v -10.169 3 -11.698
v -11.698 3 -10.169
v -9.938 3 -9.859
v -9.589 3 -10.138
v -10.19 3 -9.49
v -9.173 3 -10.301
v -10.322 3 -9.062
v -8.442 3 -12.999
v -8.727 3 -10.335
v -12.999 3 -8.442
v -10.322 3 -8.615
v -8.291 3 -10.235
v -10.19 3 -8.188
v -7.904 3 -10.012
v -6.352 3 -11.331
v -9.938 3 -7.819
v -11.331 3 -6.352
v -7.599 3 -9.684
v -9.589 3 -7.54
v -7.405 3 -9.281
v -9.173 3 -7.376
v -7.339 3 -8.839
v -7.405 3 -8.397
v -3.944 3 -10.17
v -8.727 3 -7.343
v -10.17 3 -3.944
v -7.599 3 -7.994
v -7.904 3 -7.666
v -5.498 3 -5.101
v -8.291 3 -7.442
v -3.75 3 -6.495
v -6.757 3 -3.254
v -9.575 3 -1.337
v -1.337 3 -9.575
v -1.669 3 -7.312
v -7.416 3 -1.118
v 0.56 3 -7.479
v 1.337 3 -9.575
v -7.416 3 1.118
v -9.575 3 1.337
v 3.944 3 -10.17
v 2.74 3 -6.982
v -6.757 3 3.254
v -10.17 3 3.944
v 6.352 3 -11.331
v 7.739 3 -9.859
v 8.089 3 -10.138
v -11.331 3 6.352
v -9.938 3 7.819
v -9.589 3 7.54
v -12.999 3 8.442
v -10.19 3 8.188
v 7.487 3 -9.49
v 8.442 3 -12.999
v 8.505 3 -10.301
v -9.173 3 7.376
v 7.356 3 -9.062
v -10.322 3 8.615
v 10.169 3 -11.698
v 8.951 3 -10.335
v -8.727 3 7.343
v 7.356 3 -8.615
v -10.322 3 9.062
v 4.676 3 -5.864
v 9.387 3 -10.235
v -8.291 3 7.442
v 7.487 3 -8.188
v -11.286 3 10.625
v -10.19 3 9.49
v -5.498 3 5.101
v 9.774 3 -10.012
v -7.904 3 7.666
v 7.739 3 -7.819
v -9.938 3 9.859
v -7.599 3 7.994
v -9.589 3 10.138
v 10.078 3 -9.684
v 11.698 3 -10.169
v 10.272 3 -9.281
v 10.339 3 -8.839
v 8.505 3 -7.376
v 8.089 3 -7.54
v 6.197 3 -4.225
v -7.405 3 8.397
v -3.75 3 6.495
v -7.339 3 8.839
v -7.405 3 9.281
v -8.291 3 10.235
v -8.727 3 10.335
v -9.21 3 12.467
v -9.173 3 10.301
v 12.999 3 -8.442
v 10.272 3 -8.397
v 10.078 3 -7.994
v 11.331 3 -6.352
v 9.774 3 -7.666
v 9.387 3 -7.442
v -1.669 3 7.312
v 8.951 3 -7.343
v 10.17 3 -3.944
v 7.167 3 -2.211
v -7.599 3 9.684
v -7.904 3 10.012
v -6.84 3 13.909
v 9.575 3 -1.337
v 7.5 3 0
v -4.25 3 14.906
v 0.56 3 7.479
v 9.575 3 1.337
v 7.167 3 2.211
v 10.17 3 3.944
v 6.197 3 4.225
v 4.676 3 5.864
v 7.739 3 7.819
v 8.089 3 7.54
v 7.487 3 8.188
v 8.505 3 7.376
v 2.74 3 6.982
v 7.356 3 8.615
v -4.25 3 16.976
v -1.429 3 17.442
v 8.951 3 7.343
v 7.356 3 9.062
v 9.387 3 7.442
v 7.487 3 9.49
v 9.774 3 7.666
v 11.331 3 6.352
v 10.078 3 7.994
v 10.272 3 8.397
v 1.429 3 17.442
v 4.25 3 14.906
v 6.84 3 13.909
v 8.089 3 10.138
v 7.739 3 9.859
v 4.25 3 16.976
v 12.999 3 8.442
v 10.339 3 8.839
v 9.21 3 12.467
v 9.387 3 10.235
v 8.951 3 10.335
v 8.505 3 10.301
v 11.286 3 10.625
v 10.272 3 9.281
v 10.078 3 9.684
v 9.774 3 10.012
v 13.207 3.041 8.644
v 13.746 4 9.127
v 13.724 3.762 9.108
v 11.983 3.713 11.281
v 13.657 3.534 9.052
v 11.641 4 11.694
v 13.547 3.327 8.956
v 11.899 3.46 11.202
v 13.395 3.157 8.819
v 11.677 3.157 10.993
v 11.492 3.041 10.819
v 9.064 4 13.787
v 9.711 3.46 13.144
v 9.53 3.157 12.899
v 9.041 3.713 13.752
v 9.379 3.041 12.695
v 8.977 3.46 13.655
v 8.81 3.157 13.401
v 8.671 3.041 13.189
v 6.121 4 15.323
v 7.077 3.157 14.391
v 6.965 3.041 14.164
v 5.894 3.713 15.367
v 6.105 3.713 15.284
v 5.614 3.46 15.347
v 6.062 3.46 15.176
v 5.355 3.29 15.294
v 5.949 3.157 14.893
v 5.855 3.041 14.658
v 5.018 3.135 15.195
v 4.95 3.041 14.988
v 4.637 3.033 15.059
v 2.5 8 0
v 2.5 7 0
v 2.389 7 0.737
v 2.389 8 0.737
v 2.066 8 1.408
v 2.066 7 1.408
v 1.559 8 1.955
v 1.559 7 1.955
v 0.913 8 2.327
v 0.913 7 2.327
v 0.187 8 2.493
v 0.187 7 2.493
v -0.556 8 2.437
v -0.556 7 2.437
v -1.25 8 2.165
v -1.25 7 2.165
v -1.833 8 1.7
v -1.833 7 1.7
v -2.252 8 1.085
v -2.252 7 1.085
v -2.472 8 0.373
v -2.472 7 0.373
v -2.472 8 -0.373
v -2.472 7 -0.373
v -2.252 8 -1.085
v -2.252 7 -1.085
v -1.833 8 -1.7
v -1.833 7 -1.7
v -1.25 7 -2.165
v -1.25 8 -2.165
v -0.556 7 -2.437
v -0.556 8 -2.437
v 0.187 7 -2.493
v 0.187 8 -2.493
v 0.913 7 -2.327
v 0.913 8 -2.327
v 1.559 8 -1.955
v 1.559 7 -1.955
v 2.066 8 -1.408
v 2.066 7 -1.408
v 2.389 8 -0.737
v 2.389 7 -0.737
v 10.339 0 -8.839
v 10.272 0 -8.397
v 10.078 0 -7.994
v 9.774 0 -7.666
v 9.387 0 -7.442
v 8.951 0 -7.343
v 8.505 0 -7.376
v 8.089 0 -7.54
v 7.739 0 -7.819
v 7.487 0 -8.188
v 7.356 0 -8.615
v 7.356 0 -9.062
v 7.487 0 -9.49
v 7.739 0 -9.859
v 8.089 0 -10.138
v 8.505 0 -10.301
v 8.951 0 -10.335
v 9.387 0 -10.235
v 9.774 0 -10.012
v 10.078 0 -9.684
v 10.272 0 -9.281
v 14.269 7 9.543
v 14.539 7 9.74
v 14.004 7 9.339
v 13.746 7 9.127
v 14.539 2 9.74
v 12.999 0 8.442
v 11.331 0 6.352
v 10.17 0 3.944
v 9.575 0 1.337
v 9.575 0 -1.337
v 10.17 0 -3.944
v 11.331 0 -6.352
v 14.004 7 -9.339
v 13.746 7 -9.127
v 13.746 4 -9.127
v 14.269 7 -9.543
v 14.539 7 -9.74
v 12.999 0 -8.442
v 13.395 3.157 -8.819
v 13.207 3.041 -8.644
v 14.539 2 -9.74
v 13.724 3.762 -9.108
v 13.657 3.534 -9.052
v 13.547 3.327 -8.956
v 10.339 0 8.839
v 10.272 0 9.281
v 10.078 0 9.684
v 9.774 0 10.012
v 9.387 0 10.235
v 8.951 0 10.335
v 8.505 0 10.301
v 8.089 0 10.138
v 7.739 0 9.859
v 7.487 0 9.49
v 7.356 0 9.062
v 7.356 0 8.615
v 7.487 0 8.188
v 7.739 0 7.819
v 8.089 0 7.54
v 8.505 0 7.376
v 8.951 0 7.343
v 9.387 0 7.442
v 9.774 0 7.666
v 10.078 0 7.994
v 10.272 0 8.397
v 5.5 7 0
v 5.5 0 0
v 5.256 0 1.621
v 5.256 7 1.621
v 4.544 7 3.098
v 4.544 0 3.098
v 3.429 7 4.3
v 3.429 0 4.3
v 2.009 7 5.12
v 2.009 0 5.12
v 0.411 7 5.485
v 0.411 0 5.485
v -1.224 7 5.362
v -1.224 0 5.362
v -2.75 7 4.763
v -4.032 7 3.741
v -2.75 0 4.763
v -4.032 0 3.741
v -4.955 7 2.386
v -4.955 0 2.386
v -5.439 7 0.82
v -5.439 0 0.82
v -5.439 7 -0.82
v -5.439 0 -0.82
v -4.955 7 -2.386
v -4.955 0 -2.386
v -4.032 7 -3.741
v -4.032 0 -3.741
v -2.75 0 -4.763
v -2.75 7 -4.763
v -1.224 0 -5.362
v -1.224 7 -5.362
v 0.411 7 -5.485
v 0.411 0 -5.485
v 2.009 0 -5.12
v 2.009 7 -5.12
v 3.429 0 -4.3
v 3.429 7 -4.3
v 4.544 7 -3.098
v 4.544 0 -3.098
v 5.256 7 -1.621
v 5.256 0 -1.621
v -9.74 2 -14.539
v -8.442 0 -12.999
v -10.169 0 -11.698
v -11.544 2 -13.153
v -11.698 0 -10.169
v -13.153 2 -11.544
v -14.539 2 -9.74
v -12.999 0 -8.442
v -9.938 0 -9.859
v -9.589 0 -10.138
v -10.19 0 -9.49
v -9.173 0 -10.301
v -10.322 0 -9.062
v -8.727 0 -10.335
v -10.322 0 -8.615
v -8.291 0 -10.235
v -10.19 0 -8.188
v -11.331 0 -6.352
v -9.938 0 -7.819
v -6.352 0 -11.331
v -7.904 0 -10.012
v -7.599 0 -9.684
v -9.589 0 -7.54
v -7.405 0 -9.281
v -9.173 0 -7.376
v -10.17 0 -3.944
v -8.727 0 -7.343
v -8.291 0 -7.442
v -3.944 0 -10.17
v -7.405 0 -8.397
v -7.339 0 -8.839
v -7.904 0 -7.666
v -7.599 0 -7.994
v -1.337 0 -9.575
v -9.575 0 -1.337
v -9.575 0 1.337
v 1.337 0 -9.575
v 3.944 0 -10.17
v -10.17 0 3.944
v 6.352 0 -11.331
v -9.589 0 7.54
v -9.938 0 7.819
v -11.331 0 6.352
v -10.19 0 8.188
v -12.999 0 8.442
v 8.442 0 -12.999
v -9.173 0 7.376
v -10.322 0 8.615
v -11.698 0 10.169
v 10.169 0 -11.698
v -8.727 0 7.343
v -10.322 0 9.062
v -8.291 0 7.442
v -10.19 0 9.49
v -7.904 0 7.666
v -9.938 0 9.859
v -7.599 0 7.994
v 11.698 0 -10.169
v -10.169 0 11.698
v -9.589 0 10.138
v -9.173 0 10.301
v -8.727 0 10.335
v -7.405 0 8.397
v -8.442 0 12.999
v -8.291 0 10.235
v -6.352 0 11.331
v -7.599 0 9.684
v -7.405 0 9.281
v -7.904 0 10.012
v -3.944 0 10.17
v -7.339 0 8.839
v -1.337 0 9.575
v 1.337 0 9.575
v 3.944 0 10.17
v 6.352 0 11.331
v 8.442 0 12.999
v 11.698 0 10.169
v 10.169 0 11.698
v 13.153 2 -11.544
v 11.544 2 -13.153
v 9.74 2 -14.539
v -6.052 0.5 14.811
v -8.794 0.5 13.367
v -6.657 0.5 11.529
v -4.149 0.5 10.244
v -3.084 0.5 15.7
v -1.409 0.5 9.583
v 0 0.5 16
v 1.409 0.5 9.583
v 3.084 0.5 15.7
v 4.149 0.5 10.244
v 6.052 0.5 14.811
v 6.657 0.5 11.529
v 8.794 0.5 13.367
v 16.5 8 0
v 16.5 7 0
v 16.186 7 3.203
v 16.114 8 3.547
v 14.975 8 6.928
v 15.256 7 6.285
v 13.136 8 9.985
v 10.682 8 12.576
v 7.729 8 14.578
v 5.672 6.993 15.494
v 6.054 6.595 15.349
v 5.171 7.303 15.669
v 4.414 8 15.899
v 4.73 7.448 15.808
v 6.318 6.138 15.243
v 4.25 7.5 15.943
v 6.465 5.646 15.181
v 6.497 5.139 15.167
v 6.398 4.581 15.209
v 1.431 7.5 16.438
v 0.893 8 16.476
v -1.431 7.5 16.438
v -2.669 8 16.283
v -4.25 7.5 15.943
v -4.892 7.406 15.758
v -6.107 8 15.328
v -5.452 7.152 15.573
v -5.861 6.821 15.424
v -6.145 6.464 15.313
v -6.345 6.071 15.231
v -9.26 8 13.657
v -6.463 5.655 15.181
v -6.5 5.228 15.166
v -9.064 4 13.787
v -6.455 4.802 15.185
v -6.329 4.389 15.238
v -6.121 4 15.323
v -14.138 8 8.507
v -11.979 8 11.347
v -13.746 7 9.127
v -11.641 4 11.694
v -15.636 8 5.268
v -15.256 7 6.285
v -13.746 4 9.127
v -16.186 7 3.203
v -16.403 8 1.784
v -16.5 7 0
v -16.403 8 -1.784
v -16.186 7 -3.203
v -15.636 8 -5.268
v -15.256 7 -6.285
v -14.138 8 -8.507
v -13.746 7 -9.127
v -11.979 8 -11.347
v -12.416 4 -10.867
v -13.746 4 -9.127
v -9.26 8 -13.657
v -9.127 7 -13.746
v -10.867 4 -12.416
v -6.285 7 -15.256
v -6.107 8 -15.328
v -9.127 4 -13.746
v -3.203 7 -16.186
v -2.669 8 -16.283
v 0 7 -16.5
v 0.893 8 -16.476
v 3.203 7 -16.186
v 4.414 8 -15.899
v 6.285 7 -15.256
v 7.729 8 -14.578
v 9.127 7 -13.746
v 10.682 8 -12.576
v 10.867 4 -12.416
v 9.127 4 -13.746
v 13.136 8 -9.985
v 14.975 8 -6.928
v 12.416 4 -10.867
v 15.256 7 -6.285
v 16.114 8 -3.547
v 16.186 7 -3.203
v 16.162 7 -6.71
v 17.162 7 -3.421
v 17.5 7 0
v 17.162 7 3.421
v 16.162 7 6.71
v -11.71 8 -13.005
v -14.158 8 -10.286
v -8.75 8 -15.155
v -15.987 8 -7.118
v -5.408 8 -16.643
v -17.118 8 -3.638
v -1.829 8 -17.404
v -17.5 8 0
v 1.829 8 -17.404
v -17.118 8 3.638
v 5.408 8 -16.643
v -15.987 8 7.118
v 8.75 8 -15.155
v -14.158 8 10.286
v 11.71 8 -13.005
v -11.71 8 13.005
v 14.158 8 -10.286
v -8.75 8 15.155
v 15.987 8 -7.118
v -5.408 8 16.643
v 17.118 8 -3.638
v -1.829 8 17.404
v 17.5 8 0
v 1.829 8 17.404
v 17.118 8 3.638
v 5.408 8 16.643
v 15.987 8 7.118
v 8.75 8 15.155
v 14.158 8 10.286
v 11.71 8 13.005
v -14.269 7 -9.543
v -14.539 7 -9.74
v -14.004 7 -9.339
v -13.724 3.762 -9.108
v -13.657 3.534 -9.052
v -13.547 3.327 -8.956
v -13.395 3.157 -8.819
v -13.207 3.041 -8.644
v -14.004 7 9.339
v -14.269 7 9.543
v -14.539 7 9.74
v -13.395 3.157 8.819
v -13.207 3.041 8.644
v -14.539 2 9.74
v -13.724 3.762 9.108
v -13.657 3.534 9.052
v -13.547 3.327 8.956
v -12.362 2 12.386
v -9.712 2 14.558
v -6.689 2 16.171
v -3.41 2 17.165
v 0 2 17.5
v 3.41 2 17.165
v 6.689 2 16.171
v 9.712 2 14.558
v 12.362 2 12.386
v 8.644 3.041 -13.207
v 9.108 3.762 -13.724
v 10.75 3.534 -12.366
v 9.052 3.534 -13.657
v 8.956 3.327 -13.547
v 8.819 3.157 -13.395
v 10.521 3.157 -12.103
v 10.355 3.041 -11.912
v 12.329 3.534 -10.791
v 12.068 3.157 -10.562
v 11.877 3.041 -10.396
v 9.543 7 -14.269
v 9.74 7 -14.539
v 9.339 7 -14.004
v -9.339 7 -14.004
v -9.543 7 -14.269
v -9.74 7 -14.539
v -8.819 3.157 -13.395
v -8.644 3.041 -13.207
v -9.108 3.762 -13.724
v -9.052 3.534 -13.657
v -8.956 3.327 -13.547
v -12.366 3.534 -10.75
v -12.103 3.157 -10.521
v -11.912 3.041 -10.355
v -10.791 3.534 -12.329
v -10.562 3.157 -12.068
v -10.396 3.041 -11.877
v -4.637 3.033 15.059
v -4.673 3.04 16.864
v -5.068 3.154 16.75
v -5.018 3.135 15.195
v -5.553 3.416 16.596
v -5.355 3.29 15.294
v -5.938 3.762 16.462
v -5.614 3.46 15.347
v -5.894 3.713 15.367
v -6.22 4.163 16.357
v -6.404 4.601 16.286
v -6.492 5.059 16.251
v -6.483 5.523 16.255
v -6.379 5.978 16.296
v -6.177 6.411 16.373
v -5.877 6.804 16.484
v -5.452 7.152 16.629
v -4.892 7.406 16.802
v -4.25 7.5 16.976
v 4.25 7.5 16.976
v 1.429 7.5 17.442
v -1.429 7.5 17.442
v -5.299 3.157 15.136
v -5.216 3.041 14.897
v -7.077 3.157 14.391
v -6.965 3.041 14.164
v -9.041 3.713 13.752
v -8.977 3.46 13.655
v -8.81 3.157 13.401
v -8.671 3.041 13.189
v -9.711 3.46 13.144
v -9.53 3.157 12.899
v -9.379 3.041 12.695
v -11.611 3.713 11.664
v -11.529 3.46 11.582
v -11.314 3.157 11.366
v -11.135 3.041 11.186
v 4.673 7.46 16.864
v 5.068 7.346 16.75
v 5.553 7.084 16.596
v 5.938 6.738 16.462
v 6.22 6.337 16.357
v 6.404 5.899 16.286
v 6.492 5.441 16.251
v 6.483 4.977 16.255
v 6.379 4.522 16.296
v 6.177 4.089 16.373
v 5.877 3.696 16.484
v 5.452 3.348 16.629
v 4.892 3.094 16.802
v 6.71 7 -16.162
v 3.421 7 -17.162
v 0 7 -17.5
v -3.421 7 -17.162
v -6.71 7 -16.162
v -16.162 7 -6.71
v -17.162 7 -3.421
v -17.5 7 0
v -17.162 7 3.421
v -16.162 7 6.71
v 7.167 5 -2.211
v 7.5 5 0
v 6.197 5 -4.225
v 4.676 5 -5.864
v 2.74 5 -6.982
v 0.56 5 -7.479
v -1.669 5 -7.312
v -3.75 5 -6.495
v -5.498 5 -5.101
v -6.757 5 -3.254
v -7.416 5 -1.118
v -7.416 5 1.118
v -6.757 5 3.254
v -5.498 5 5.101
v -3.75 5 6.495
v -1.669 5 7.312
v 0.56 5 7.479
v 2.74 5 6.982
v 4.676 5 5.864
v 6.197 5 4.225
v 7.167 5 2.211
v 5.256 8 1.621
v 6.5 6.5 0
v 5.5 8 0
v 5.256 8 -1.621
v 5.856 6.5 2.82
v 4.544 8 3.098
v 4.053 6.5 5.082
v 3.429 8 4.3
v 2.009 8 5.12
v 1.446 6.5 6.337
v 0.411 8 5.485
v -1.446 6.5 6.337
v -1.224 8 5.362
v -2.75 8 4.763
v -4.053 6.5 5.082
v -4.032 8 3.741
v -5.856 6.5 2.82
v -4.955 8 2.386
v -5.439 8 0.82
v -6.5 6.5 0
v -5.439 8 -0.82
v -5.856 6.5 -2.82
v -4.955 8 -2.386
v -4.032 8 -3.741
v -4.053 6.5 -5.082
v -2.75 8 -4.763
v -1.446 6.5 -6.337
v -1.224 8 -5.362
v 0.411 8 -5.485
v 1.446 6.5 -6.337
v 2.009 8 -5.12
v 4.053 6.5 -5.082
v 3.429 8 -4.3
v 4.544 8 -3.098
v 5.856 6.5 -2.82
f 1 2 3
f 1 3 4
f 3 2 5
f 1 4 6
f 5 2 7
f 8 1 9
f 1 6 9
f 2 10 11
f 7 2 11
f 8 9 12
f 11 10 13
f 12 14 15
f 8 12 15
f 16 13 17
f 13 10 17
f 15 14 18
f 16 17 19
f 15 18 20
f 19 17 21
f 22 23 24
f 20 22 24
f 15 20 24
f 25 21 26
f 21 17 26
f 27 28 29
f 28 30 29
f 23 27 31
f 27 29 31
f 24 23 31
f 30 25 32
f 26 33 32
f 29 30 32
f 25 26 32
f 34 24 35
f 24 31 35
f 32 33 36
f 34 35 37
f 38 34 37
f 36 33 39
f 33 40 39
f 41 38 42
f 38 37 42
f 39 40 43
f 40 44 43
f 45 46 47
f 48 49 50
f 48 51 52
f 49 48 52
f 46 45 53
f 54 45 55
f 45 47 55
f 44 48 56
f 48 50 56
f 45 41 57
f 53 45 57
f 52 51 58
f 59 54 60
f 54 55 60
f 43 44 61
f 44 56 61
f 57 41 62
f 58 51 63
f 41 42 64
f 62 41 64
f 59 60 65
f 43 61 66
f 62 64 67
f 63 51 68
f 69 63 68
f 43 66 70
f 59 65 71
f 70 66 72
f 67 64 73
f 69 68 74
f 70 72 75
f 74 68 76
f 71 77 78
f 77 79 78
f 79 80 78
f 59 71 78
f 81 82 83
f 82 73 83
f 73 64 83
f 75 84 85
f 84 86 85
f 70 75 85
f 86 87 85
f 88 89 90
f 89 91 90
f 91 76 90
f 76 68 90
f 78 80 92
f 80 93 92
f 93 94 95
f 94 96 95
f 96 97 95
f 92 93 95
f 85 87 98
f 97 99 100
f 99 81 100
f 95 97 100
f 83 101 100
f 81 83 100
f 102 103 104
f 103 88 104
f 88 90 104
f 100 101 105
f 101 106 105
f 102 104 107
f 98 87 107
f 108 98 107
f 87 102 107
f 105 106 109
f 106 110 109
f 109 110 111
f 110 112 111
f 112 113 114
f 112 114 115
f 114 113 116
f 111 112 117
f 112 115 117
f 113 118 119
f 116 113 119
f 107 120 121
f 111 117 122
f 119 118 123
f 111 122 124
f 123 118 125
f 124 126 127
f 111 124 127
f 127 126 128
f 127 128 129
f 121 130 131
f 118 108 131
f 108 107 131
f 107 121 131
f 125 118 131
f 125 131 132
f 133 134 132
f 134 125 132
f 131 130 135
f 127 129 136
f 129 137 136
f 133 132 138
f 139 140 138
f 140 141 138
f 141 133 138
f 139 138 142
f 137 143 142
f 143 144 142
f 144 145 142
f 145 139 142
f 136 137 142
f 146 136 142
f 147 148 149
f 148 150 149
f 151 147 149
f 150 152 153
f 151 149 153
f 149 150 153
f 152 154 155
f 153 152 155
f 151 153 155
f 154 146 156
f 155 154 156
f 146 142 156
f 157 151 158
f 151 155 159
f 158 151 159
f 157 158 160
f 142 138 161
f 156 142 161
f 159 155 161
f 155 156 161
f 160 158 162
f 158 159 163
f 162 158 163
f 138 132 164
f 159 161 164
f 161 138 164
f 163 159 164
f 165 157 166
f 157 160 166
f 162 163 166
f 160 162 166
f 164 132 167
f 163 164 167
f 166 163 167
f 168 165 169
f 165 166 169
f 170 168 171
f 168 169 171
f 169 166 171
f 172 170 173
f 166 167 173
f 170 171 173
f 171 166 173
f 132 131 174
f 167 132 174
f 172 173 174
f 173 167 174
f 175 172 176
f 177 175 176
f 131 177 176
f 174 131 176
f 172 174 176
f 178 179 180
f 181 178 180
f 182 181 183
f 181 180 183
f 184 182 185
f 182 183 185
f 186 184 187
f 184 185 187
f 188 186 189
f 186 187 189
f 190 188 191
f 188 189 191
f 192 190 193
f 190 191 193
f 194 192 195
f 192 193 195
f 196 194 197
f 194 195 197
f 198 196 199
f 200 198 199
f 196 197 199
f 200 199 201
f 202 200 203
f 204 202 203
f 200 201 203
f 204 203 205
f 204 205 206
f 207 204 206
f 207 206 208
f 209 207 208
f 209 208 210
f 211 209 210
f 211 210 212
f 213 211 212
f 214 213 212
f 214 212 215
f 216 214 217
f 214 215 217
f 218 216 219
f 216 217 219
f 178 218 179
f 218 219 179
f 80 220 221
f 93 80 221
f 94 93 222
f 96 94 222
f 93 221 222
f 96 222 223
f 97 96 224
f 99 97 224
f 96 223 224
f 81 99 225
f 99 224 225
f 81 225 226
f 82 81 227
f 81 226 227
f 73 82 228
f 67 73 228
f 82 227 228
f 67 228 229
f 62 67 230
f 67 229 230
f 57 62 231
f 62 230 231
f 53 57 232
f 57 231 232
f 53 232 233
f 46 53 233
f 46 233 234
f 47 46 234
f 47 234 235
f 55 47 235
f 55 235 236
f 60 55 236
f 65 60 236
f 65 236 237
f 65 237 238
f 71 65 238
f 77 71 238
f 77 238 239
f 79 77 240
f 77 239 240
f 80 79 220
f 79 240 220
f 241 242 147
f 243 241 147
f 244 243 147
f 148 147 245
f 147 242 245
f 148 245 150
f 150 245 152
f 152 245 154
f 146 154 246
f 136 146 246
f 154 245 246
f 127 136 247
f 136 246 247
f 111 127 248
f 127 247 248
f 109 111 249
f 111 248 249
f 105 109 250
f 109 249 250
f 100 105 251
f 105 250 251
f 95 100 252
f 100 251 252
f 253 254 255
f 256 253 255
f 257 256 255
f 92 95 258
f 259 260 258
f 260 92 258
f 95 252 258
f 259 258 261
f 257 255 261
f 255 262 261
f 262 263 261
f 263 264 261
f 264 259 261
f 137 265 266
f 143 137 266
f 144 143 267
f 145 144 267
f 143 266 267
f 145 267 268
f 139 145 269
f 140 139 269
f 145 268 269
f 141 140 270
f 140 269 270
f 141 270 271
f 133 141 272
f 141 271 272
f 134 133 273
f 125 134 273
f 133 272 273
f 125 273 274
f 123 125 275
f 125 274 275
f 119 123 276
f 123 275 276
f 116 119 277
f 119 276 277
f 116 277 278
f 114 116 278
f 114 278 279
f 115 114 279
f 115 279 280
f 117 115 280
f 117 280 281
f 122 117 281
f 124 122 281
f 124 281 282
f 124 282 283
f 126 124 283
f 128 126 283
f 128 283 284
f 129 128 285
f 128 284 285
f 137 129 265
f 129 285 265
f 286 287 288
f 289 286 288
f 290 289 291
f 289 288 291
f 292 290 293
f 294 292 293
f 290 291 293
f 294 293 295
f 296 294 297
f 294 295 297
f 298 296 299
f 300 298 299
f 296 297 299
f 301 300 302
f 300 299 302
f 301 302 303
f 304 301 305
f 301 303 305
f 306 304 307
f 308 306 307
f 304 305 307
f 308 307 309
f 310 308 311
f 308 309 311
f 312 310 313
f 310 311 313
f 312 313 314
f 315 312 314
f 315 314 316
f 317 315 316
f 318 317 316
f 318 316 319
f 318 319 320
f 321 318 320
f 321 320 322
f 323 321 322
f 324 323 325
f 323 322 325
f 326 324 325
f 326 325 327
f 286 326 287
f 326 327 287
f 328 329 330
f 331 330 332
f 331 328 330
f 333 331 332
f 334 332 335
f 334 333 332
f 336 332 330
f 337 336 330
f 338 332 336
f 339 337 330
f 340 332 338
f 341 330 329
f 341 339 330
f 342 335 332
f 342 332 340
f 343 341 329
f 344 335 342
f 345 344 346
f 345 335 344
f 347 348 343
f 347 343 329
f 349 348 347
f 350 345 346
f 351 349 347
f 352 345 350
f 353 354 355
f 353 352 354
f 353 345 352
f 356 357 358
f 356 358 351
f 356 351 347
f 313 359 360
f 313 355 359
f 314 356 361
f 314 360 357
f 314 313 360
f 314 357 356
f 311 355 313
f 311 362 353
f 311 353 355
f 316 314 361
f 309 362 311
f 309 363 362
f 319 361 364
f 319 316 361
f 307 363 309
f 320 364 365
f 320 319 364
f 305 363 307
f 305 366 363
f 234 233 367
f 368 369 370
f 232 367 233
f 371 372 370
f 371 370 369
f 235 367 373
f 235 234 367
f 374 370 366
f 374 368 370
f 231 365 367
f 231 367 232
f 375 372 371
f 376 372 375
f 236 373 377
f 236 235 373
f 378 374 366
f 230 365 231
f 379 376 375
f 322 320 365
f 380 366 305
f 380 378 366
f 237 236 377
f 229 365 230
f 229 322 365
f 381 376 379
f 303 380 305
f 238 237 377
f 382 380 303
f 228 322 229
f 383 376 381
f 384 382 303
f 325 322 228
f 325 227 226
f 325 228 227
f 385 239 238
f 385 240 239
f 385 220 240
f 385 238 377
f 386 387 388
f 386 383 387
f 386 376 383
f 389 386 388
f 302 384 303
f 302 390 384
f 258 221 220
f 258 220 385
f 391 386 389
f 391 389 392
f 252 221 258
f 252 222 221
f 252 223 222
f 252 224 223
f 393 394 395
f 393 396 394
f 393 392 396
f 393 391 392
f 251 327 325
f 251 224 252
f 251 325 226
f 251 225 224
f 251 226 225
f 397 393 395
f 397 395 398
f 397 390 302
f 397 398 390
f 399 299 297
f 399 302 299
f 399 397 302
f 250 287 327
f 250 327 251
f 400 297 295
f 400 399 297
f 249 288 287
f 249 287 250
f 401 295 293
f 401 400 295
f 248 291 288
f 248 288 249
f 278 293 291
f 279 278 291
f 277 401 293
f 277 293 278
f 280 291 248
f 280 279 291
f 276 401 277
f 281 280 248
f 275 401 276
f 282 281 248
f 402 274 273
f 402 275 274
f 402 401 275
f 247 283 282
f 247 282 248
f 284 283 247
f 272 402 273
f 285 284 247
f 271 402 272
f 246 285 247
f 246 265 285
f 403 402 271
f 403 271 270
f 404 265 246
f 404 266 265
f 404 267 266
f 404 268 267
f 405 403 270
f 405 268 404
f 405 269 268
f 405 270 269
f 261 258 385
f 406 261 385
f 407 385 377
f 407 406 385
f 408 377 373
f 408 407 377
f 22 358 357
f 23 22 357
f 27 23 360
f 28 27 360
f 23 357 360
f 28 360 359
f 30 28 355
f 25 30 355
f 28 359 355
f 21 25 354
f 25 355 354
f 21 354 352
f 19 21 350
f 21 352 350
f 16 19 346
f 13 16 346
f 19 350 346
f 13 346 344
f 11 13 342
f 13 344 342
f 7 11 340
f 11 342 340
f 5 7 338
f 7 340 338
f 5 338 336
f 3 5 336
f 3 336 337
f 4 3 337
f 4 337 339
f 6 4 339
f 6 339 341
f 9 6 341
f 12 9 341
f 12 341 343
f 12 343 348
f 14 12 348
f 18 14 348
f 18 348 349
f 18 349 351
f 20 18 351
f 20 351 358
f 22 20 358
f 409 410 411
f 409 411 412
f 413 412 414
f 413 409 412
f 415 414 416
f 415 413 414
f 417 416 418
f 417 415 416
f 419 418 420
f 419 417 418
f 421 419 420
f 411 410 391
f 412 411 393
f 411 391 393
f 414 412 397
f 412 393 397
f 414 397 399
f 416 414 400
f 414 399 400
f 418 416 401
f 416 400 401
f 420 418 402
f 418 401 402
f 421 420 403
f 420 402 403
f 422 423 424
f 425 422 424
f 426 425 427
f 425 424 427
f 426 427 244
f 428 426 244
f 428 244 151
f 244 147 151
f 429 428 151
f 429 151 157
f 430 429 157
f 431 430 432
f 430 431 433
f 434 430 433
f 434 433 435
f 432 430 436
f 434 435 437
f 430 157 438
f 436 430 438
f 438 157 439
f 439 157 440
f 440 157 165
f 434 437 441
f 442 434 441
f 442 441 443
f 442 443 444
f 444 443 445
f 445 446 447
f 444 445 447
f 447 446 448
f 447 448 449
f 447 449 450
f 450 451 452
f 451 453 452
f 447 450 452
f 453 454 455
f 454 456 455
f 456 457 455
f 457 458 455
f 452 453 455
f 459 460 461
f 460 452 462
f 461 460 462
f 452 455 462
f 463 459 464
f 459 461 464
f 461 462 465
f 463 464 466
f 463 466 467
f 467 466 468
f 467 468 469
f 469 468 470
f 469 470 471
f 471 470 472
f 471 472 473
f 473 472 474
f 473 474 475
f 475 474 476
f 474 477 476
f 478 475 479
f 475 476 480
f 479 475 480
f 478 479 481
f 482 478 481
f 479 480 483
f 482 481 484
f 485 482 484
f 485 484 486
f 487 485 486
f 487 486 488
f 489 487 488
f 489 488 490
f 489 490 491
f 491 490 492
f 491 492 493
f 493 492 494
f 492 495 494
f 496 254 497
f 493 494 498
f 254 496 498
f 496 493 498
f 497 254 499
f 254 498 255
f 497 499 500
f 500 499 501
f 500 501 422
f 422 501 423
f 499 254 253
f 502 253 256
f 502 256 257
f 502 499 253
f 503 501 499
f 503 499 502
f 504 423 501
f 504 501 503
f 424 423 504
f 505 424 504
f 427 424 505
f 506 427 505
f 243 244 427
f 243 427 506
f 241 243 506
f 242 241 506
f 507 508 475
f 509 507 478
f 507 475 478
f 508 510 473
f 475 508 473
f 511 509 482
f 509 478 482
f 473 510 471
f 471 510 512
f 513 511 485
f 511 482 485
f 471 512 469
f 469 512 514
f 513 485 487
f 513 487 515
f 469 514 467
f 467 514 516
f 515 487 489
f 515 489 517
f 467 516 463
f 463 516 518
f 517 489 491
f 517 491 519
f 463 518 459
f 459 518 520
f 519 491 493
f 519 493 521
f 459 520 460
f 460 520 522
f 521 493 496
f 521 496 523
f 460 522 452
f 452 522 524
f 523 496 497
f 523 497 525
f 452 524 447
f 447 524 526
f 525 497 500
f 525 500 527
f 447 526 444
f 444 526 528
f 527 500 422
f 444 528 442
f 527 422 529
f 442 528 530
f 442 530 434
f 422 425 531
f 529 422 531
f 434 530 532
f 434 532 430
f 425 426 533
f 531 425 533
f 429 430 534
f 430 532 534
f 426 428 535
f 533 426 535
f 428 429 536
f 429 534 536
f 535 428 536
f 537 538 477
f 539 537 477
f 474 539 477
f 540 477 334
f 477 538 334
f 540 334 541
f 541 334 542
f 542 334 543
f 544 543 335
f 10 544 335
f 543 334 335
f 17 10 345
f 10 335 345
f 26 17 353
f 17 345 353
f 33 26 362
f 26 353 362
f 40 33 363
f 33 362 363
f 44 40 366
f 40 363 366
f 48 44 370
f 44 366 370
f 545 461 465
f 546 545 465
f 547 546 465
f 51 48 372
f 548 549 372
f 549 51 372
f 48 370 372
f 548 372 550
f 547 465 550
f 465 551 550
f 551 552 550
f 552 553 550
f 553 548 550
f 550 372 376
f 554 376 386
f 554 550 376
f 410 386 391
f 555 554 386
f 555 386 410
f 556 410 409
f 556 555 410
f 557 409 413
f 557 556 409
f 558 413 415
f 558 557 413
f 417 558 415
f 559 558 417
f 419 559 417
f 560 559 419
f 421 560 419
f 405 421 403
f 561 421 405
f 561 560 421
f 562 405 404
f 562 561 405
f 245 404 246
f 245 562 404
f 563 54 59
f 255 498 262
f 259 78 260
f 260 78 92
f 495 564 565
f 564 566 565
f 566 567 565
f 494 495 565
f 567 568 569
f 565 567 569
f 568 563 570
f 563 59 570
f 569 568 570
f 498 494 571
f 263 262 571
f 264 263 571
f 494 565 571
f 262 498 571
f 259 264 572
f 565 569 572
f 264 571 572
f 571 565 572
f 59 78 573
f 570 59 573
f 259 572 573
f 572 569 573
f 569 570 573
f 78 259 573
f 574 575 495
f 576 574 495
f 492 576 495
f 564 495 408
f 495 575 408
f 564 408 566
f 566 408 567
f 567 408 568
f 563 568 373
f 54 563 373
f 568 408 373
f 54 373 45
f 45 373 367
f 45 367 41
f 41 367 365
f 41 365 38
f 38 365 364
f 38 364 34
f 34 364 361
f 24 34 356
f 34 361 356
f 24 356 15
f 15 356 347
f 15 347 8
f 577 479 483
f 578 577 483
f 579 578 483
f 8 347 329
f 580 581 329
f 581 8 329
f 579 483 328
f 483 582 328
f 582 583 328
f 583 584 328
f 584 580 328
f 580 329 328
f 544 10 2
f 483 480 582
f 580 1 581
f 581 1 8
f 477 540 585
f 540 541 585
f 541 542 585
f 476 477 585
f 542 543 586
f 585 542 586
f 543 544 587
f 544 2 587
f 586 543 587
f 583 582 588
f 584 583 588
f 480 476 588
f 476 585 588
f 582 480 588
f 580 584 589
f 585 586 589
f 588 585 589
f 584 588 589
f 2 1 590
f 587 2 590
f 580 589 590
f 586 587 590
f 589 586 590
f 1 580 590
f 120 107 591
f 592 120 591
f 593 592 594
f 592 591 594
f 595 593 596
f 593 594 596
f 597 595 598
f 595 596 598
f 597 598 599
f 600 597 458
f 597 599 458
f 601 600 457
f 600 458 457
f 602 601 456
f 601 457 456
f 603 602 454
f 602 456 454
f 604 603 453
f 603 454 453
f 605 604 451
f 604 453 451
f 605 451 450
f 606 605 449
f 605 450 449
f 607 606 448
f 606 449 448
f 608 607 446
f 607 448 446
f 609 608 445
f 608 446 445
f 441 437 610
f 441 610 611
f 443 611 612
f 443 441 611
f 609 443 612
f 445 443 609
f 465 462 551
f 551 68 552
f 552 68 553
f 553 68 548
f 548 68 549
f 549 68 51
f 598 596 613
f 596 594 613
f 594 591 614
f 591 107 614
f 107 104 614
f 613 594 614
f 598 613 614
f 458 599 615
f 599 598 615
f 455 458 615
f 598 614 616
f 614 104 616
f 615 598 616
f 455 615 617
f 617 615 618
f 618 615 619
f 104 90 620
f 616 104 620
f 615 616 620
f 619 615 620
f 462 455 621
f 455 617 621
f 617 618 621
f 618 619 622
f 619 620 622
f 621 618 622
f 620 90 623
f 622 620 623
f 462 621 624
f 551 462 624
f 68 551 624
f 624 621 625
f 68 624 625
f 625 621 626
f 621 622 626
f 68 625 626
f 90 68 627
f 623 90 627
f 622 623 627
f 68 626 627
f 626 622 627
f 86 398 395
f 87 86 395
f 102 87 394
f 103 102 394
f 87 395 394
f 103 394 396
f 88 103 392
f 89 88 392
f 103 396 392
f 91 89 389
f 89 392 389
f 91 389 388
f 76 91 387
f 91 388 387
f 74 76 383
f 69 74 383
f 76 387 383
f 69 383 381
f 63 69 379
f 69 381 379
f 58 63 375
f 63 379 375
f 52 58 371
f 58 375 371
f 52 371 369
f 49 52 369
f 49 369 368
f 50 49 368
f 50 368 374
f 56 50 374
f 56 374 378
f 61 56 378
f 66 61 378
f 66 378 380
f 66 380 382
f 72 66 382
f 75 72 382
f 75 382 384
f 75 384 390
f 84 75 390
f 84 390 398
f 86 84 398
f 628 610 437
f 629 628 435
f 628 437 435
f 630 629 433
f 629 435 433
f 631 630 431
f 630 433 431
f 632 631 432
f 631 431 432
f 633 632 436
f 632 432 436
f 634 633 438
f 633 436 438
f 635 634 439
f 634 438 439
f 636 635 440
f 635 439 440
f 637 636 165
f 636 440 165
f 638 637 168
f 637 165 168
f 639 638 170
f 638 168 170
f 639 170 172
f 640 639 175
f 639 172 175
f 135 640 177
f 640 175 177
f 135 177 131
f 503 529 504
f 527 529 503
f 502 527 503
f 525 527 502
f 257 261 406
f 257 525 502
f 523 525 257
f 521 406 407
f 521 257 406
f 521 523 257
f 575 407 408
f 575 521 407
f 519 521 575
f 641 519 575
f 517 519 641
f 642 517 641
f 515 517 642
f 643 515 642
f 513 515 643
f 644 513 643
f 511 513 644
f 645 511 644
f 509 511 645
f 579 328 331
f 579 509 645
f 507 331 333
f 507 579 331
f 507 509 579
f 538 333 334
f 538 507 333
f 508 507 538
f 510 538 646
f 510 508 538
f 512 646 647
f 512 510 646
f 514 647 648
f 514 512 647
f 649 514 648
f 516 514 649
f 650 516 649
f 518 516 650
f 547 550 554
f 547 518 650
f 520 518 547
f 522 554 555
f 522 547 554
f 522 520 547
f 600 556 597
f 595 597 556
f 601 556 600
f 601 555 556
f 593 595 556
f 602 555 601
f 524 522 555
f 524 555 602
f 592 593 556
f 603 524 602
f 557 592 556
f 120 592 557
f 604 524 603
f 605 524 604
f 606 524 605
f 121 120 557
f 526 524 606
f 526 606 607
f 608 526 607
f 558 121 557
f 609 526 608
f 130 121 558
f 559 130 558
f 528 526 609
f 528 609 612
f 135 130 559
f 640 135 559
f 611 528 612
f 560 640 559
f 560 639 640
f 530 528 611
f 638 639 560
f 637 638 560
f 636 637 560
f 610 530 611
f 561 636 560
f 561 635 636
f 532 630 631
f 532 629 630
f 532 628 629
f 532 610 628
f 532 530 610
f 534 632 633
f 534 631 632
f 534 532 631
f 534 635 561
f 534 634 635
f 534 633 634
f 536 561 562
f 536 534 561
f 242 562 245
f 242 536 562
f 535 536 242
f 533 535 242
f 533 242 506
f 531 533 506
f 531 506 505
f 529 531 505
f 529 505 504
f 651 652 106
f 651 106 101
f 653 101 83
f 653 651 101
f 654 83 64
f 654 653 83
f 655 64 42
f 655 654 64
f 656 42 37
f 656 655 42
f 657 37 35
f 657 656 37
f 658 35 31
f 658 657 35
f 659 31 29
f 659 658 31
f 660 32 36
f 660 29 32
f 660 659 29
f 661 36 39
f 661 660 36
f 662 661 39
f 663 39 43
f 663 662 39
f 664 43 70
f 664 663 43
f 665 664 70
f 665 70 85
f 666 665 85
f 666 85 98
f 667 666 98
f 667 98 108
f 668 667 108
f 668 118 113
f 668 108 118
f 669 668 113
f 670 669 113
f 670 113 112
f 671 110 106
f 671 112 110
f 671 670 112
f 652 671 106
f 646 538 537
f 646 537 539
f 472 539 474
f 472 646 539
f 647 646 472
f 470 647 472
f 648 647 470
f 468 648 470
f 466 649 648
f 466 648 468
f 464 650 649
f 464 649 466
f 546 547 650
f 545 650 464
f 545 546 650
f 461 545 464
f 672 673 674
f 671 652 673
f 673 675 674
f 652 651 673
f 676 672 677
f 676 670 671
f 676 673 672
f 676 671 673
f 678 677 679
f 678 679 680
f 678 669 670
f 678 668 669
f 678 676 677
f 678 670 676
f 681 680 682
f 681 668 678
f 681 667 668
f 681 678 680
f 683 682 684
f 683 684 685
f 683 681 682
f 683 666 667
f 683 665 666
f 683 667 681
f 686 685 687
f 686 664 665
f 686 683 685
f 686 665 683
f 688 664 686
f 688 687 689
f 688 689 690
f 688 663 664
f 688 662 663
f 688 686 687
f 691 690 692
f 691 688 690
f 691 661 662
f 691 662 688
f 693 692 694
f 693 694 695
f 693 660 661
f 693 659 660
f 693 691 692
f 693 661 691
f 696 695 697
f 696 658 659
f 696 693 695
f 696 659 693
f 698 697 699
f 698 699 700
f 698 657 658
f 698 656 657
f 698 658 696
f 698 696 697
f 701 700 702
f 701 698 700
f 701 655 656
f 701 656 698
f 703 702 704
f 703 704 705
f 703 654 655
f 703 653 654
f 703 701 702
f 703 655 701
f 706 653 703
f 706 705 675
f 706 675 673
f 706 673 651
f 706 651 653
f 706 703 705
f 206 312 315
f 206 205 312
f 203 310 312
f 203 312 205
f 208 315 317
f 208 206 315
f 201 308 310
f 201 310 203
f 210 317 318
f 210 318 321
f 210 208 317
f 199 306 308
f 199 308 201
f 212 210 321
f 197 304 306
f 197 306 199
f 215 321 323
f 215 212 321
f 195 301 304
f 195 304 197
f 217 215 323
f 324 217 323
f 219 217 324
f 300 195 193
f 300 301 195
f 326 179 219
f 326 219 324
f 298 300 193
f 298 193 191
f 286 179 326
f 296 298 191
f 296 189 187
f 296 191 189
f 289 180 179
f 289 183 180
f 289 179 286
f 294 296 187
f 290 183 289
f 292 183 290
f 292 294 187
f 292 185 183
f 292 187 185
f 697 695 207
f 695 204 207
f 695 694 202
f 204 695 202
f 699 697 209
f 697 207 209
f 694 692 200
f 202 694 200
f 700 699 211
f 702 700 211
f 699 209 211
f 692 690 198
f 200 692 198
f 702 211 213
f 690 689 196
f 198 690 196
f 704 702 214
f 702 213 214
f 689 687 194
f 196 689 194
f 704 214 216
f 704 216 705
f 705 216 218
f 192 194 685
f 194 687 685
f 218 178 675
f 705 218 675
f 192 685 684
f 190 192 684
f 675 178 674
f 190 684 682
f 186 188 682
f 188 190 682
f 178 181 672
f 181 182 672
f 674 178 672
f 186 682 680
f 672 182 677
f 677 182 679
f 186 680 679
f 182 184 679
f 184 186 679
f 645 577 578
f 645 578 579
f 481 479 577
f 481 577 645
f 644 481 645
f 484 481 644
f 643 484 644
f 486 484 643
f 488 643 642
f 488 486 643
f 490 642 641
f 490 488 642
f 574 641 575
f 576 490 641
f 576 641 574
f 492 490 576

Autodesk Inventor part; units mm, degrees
ref_plane "YZ Plane" through (0, 0, 0) normal (1, 0, 0) x (0, 1, 0)
ref_plane "XZ Plane" through (0, 0, 0) normal (0, 1, 0) x (-1, 0, 0)
sketch "Sketch1" plane through (0, 0, 0) normal (0, 0, 1) x (1, 0, 0)
  line L0 (0, 0) -> (17.5, 0)
  line L1 (17.5, 0) -> (17.5, 8)
  line L2 (17.5, 8) -> (0, 8)
  line L3 (0, 8) -> (0, 0)
  line L4 (0, 8) -> (16.5, 8)
  line L5 (16.5, 8) -> (16.5, 3)
  line L6 (16.5, 3) -> (0, 3)
  line L7 (0, 3) -> (0, 8)
  line L8 (0, 3) -> (7.5, 3)
  line L9 (7.5, 3) -> (7.5, 5)
  line L10 (7.5, 5) -> (0, 5)
  line L11 (0, 5) -> (0, 3)
  line L12 (7.5, 5) -> (5.5, 8)
  line L13 (0, 8) -> (2.5, 8)
  line L14 (2.5, 8) -> (2.5, 0)
  line L15 (2.5, 0) -> (0, 0)
  line L16 (0, 0) -> (0, 8)
  point P0 (16.5, 5.5)
  dimension "d0" = 17.5
  dimension "d1" = 8
  dimension "d2" = 1
  dimension "d3" = 3
  dimension "d4" = 7.5
  dimension "d5" = 2
  dimension "d6" = 5.5
  dimension "d7" = 2.5
revolve "Revolution1" add sketch "Sketch1" angle 360 about axis through (0, 8, 0) along (0, -1, 0) contours L14 L6 L5 L2 L1 L0 | L14 L10 L9 L6 | L14 L2 L12 L10
chamfer "Chamfer1" distance 2 angle 45 1 edges at (-17.5, 0, 0)
fillet "Fillet1" radius 1 1 edges at (-16.5, 3, 0)
sketch "Sketch2" plane through (0, 0, 0) normal (0, -1, 0) x (1, 0, 0)
  circle A0 centre (0, 0) radius 12.5 construction
  line L0 (0, 12.5) -> (0, 0) construction
  circle A1 centre (0, 0) radius 2.5 projected
  circle A2 centre (0, 0) radius 15.5 projected
  circle A3 centre (0, 0) radius 15.5 projected
  line L1 (0, 0) -> (-8.8388, 8.8388) construction
  circle A4 centre (-8.8388, 8.8388) radius 1.5
  circle A5 centre (-8.8388, -8.8388) radius 1.5
  circle A6 centre (8.8388, -8.8388) radius 1.5
  circle A7 centre (8.8388, 8.8388) radius 1.5
  line L2 (-8.4184, 13.0146) -> (-13.0146, 8.4184) construction
  line L3 (8.4184, 13.0146) -> (13.0146, 8.4184) construction
  circle A8 centre (0, 0) radius 9.5 construction
  circle A9 centre (0, 21.433) radius 11.933
  circle A10 centre (-21.433, 0) radius 11.933
  circle A11 centre (0, -21.433) radius 11.933
  circle A12 centre (21.433, 0) radius 11.933
  circle A13 centre (0, 0) radius 5.5
  point P0 (-10.7165, 10.7165)
  point P1 (-8.4421, -12.9993)
  point P2 (8.4421, -12.9993)
  dimension "d13" = 25
  dimension "d15" = 45
  dimension "d16" = 3
  dimension "d19" = 360
  dimension "d21" = 6.5
  dimension "d22" = 19
  dimension "d25" = 360
  dimension "d27" = 11
extrude "Extrusion1" cut sketch "Sketch2" against normal blind 7 contours A1 | A2 A12 | A2 A12 | A11 A2 | A2 A11 | A10 A2 | A2 A10 | A4 | A5 | A6 | A7 | A13
extrude "Extrusion2" cut sketch "Sketch2" against normal blind 0.5 contours A9 A2 | A2 A9
ref_plane "Work Plane1" through (0, 0, 10) normal (0, 0, 1) x (1, 0, 0)
sketch "Sketch3" plane through (0, 0, 10) normal (0, 0, 1) x (1, 0, 0)
  line L0 (-17.5, 8) -> (17.5, 8) projected
  line L1 (0, 8) -> (0, 0) construction
  line L2 (-4.25, 5.25) -> (4.25, 5.25) construction
  line L3 (5.5, 0) -> (-5.5, 0) projected
  line L4 (-4.25, 3) -> (4.25, 3)
  line L5 (4.25, 7.5) -> (-4.25, 7.5)
  arc A0 (-4.25, 7.5) -> (-4.25, 3) centre (-4.25, 5.25) ccw
  arc A1 (4.25, 3) -> (4.25, 7.5) centre (4.25, 5.25) ccw
  line L6 (8.7938, 0.5) -> (-8.7938, 0.5) projected
  point P0 (0, 5.25)
  dimension "d33" = 2.5
  dimension "d34" = 2.25
  dimension "d35" = 8.5
extrude "Extrusion3" cut sketch "Sketch3" along normal through all
properties part number "Base" material "Stainless Steel"
